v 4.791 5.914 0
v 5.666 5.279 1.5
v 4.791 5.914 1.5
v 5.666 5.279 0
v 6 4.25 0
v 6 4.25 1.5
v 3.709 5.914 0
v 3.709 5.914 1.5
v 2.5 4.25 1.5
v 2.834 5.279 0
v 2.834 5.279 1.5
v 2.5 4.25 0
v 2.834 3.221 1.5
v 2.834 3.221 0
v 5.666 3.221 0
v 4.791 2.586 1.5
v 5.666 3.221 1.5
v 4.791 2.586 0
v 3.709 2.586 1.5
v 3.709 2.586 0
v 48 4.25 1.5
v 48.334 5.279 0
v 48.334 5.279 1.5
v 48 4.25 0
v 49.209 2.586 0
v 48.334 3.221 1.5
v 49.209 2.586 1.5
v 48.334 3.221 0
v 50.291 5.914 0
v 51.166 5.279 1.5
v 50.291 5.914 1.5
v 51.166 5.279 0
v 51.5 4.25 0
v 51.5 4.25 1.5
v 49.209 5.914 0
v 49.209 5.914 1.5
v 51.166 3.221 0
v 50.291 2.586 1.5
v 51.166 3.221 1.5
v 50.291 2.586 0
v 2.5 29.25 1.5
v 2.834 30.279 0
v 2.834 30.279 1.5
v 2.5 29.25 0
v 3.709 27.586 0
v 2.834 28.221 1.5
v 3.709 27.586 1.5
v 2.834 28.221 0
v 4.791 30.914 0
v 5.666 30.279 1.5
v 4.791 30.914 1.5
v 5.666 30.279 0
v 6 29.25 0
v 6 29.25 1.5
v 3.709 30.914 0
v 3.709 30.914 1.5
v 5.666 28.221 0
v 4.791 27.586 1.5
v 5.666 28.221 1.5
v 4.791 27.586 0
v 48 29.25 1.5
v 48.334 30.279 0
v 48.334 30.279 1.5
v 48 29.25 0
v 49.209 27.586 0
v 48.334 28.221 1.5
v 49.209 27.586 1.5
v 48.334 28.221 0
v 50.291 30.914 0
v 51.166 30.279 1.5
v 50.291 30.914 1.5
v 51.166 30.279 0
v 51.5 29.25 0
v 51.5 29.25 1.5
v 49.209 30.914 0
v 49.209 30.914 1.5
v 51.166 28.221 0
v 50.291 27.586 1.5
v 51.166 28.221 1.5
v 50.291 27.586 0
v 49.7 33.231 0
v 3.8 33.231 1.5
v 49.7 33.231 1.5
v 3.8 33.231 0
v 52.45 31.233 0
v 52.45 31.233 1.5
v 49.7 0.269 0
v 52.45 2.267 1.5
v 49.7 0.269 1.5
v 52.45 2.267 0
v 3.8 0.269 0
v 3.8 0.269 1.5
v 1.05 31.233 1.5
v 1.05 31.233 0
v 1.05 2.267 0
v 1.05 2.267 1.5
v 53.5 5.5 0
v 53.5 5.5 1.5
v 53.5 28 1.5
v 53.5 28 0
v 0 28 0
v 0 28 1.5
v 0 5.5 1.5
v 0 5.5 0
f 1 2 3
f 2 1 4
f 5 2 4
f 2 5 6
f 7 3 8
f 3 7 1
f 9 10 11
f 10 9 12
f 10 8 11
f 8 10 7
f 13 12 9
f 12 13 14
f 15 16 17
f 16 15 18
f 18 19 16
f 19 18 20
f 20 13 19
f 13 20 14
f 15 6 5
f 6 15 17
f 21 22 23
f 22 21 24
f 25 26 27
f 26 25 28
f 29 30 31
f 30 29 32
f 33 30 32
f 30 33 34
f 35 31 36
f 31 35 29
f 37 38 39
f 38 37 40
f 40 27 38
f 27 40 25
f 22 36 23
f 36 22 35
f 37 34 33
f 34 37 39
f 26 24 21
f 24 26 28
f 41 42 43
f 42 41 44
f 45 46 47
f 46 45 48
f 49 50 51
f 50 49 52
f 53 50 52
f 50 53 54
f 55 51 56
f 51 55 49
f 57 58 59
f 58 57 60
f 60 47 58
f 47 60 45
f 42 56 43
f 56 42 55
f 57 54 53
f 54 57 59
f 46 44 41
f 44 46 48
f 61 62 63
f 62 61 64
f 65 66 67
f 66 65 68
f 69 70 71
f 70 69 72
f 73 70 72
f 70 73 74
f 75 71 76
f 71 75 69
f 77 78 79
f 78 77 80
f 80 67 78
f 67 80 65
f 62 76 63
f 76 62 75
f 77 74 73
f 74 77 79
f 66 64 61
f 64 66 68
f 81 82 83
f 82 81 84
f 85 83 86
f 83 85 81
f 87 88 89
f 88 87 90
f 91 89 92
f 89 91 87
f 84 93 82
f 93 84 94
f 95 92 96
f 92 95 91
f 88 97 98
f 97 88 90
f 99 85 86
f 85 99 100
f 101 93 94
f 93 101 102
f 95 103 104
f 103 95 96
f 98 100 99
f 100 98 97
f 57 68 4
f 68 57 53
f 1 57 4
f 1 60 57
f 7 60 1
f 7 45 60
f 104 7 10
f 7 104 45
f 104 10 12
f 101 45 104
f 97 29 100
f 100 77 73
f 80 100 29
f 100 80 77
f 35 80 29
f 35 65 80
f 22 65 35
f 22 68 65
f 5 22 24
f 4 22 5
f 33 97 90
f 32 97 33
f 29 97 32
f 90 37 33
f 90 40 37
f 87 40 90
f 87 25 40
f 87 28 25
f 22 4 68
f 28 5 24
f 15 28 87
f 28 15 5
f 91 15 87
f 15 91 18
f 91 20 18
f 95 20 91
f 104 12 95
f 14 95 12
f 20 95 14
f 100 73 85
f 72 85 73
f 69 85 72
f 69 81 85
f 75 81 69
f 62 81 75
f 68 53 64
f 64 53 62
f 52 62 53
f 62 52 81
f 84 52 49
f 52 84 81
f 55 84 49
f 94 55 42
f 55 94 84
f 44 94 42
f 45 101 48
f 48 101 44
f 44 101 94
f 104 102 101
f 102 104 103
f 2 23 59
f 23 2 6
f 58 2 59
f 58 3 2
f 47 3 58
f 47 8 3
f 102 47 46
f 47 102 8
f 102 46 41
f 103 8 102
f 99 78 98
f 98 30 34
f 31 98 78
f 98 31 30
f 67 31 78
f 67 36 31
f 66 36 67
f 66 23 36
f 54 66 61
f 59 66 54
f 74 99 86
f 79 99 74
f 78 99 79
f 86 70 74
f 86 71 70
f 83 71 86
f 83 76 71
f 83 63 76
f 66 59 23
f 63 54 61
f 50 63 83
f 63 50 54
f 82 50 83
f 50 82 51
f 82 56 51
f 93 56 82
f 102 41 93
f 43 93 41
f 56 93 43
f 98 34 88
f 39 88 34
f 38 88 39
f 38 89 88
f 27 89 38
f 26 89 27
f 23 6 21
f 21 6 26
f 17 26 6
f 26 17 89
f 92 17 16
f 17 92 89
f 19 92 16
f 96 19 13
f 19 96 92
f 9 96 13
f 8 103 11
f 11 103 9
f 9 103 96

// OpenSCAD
$fn=10;

proto_board();

module proto_board() {
	width=53.5;
	height=33.5;
	thickness=1.5;

	difference() {
		footprint();
		mounting_holes();
	}

	module footprint() {
		d=11;
		hull() {
			translate([d/2,d/2,0])
			cylinder(h=thickness, d=d);

			translate([d/2,height-d/2,0])
			cylinder(h=thickness, d=d);

			translate([width-d/2,d/2,0])
			cylinder(h=thickness, d=d);

			translate([width-d/2,height-d/2,0])
			cylinder(h=thickness, d=d);
		}
	}

	module mounting_holes() {
		translate([4.25,4.25,-0.5])
		cylinder(h=thickness+1, d=3.5);

		translate([width-4.25+0.5,4.25,-0.5])
		cylinder(h=thickness+1, d=3.5);

		translate([4.25,height-4.25,-0.5])
		cylinder(h=thickness+1, d=3.5);

		translate([width-4.25+0.5,height-4.25,-0.5])
		cylinder(h=thickness+1, d=3.5);
	}
}
